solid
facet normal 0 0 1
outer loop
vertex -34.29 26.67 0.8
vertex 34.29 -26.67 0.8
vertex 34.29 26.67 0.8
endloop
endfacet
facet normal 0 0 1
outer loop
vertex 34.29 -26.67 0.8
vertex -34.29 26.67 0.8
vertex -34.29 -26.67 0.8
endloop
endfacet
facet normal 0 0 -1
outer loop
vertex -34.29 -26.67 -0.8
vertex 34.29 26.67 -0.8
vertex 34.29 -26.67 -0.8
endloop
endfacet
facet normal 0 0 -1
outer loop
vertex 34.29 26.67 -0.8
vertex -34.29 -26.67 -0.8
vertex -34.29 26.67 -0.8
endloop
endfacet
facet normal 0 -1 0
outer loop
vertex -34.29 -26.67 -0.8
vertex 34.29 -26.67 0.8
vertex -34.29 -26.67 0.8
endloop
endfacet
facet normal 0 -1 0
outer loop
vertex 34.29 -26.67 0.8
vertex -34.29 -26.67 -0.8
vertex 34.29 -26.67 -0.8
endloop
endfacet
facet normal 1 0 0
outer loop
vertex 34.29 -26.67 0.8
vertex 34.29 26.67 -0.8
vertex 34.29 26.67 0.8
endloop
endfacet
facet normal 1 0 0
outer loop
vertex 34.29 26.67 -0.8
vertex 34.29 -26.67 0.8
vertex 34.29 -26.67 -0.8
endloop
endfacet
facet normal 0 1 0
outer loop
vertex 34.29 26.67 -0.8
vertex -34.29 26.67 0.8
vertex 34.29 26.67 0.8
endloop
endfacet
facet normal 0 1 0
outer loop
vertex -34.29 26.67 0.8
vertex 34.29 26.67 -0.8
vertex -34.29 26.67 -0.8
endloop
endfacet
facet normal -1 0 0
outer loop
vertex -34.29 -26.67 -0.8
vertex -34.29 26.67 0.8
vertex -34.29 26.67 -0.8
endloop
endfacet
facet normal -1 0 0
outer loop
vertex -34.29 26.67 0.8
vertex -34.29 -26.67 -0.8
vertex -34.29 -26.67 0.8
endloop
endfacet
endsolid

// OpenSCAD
$fn=64;

board_x = 68.58;
board_y = 53.34;
board_t = 1.6;

module dev_board(x, y, t) {
    translate([-x/2, -y/2, -t/2])
        cube([x, y, t], center=false);
}

dev_board(board_x, board_y, board_t);
